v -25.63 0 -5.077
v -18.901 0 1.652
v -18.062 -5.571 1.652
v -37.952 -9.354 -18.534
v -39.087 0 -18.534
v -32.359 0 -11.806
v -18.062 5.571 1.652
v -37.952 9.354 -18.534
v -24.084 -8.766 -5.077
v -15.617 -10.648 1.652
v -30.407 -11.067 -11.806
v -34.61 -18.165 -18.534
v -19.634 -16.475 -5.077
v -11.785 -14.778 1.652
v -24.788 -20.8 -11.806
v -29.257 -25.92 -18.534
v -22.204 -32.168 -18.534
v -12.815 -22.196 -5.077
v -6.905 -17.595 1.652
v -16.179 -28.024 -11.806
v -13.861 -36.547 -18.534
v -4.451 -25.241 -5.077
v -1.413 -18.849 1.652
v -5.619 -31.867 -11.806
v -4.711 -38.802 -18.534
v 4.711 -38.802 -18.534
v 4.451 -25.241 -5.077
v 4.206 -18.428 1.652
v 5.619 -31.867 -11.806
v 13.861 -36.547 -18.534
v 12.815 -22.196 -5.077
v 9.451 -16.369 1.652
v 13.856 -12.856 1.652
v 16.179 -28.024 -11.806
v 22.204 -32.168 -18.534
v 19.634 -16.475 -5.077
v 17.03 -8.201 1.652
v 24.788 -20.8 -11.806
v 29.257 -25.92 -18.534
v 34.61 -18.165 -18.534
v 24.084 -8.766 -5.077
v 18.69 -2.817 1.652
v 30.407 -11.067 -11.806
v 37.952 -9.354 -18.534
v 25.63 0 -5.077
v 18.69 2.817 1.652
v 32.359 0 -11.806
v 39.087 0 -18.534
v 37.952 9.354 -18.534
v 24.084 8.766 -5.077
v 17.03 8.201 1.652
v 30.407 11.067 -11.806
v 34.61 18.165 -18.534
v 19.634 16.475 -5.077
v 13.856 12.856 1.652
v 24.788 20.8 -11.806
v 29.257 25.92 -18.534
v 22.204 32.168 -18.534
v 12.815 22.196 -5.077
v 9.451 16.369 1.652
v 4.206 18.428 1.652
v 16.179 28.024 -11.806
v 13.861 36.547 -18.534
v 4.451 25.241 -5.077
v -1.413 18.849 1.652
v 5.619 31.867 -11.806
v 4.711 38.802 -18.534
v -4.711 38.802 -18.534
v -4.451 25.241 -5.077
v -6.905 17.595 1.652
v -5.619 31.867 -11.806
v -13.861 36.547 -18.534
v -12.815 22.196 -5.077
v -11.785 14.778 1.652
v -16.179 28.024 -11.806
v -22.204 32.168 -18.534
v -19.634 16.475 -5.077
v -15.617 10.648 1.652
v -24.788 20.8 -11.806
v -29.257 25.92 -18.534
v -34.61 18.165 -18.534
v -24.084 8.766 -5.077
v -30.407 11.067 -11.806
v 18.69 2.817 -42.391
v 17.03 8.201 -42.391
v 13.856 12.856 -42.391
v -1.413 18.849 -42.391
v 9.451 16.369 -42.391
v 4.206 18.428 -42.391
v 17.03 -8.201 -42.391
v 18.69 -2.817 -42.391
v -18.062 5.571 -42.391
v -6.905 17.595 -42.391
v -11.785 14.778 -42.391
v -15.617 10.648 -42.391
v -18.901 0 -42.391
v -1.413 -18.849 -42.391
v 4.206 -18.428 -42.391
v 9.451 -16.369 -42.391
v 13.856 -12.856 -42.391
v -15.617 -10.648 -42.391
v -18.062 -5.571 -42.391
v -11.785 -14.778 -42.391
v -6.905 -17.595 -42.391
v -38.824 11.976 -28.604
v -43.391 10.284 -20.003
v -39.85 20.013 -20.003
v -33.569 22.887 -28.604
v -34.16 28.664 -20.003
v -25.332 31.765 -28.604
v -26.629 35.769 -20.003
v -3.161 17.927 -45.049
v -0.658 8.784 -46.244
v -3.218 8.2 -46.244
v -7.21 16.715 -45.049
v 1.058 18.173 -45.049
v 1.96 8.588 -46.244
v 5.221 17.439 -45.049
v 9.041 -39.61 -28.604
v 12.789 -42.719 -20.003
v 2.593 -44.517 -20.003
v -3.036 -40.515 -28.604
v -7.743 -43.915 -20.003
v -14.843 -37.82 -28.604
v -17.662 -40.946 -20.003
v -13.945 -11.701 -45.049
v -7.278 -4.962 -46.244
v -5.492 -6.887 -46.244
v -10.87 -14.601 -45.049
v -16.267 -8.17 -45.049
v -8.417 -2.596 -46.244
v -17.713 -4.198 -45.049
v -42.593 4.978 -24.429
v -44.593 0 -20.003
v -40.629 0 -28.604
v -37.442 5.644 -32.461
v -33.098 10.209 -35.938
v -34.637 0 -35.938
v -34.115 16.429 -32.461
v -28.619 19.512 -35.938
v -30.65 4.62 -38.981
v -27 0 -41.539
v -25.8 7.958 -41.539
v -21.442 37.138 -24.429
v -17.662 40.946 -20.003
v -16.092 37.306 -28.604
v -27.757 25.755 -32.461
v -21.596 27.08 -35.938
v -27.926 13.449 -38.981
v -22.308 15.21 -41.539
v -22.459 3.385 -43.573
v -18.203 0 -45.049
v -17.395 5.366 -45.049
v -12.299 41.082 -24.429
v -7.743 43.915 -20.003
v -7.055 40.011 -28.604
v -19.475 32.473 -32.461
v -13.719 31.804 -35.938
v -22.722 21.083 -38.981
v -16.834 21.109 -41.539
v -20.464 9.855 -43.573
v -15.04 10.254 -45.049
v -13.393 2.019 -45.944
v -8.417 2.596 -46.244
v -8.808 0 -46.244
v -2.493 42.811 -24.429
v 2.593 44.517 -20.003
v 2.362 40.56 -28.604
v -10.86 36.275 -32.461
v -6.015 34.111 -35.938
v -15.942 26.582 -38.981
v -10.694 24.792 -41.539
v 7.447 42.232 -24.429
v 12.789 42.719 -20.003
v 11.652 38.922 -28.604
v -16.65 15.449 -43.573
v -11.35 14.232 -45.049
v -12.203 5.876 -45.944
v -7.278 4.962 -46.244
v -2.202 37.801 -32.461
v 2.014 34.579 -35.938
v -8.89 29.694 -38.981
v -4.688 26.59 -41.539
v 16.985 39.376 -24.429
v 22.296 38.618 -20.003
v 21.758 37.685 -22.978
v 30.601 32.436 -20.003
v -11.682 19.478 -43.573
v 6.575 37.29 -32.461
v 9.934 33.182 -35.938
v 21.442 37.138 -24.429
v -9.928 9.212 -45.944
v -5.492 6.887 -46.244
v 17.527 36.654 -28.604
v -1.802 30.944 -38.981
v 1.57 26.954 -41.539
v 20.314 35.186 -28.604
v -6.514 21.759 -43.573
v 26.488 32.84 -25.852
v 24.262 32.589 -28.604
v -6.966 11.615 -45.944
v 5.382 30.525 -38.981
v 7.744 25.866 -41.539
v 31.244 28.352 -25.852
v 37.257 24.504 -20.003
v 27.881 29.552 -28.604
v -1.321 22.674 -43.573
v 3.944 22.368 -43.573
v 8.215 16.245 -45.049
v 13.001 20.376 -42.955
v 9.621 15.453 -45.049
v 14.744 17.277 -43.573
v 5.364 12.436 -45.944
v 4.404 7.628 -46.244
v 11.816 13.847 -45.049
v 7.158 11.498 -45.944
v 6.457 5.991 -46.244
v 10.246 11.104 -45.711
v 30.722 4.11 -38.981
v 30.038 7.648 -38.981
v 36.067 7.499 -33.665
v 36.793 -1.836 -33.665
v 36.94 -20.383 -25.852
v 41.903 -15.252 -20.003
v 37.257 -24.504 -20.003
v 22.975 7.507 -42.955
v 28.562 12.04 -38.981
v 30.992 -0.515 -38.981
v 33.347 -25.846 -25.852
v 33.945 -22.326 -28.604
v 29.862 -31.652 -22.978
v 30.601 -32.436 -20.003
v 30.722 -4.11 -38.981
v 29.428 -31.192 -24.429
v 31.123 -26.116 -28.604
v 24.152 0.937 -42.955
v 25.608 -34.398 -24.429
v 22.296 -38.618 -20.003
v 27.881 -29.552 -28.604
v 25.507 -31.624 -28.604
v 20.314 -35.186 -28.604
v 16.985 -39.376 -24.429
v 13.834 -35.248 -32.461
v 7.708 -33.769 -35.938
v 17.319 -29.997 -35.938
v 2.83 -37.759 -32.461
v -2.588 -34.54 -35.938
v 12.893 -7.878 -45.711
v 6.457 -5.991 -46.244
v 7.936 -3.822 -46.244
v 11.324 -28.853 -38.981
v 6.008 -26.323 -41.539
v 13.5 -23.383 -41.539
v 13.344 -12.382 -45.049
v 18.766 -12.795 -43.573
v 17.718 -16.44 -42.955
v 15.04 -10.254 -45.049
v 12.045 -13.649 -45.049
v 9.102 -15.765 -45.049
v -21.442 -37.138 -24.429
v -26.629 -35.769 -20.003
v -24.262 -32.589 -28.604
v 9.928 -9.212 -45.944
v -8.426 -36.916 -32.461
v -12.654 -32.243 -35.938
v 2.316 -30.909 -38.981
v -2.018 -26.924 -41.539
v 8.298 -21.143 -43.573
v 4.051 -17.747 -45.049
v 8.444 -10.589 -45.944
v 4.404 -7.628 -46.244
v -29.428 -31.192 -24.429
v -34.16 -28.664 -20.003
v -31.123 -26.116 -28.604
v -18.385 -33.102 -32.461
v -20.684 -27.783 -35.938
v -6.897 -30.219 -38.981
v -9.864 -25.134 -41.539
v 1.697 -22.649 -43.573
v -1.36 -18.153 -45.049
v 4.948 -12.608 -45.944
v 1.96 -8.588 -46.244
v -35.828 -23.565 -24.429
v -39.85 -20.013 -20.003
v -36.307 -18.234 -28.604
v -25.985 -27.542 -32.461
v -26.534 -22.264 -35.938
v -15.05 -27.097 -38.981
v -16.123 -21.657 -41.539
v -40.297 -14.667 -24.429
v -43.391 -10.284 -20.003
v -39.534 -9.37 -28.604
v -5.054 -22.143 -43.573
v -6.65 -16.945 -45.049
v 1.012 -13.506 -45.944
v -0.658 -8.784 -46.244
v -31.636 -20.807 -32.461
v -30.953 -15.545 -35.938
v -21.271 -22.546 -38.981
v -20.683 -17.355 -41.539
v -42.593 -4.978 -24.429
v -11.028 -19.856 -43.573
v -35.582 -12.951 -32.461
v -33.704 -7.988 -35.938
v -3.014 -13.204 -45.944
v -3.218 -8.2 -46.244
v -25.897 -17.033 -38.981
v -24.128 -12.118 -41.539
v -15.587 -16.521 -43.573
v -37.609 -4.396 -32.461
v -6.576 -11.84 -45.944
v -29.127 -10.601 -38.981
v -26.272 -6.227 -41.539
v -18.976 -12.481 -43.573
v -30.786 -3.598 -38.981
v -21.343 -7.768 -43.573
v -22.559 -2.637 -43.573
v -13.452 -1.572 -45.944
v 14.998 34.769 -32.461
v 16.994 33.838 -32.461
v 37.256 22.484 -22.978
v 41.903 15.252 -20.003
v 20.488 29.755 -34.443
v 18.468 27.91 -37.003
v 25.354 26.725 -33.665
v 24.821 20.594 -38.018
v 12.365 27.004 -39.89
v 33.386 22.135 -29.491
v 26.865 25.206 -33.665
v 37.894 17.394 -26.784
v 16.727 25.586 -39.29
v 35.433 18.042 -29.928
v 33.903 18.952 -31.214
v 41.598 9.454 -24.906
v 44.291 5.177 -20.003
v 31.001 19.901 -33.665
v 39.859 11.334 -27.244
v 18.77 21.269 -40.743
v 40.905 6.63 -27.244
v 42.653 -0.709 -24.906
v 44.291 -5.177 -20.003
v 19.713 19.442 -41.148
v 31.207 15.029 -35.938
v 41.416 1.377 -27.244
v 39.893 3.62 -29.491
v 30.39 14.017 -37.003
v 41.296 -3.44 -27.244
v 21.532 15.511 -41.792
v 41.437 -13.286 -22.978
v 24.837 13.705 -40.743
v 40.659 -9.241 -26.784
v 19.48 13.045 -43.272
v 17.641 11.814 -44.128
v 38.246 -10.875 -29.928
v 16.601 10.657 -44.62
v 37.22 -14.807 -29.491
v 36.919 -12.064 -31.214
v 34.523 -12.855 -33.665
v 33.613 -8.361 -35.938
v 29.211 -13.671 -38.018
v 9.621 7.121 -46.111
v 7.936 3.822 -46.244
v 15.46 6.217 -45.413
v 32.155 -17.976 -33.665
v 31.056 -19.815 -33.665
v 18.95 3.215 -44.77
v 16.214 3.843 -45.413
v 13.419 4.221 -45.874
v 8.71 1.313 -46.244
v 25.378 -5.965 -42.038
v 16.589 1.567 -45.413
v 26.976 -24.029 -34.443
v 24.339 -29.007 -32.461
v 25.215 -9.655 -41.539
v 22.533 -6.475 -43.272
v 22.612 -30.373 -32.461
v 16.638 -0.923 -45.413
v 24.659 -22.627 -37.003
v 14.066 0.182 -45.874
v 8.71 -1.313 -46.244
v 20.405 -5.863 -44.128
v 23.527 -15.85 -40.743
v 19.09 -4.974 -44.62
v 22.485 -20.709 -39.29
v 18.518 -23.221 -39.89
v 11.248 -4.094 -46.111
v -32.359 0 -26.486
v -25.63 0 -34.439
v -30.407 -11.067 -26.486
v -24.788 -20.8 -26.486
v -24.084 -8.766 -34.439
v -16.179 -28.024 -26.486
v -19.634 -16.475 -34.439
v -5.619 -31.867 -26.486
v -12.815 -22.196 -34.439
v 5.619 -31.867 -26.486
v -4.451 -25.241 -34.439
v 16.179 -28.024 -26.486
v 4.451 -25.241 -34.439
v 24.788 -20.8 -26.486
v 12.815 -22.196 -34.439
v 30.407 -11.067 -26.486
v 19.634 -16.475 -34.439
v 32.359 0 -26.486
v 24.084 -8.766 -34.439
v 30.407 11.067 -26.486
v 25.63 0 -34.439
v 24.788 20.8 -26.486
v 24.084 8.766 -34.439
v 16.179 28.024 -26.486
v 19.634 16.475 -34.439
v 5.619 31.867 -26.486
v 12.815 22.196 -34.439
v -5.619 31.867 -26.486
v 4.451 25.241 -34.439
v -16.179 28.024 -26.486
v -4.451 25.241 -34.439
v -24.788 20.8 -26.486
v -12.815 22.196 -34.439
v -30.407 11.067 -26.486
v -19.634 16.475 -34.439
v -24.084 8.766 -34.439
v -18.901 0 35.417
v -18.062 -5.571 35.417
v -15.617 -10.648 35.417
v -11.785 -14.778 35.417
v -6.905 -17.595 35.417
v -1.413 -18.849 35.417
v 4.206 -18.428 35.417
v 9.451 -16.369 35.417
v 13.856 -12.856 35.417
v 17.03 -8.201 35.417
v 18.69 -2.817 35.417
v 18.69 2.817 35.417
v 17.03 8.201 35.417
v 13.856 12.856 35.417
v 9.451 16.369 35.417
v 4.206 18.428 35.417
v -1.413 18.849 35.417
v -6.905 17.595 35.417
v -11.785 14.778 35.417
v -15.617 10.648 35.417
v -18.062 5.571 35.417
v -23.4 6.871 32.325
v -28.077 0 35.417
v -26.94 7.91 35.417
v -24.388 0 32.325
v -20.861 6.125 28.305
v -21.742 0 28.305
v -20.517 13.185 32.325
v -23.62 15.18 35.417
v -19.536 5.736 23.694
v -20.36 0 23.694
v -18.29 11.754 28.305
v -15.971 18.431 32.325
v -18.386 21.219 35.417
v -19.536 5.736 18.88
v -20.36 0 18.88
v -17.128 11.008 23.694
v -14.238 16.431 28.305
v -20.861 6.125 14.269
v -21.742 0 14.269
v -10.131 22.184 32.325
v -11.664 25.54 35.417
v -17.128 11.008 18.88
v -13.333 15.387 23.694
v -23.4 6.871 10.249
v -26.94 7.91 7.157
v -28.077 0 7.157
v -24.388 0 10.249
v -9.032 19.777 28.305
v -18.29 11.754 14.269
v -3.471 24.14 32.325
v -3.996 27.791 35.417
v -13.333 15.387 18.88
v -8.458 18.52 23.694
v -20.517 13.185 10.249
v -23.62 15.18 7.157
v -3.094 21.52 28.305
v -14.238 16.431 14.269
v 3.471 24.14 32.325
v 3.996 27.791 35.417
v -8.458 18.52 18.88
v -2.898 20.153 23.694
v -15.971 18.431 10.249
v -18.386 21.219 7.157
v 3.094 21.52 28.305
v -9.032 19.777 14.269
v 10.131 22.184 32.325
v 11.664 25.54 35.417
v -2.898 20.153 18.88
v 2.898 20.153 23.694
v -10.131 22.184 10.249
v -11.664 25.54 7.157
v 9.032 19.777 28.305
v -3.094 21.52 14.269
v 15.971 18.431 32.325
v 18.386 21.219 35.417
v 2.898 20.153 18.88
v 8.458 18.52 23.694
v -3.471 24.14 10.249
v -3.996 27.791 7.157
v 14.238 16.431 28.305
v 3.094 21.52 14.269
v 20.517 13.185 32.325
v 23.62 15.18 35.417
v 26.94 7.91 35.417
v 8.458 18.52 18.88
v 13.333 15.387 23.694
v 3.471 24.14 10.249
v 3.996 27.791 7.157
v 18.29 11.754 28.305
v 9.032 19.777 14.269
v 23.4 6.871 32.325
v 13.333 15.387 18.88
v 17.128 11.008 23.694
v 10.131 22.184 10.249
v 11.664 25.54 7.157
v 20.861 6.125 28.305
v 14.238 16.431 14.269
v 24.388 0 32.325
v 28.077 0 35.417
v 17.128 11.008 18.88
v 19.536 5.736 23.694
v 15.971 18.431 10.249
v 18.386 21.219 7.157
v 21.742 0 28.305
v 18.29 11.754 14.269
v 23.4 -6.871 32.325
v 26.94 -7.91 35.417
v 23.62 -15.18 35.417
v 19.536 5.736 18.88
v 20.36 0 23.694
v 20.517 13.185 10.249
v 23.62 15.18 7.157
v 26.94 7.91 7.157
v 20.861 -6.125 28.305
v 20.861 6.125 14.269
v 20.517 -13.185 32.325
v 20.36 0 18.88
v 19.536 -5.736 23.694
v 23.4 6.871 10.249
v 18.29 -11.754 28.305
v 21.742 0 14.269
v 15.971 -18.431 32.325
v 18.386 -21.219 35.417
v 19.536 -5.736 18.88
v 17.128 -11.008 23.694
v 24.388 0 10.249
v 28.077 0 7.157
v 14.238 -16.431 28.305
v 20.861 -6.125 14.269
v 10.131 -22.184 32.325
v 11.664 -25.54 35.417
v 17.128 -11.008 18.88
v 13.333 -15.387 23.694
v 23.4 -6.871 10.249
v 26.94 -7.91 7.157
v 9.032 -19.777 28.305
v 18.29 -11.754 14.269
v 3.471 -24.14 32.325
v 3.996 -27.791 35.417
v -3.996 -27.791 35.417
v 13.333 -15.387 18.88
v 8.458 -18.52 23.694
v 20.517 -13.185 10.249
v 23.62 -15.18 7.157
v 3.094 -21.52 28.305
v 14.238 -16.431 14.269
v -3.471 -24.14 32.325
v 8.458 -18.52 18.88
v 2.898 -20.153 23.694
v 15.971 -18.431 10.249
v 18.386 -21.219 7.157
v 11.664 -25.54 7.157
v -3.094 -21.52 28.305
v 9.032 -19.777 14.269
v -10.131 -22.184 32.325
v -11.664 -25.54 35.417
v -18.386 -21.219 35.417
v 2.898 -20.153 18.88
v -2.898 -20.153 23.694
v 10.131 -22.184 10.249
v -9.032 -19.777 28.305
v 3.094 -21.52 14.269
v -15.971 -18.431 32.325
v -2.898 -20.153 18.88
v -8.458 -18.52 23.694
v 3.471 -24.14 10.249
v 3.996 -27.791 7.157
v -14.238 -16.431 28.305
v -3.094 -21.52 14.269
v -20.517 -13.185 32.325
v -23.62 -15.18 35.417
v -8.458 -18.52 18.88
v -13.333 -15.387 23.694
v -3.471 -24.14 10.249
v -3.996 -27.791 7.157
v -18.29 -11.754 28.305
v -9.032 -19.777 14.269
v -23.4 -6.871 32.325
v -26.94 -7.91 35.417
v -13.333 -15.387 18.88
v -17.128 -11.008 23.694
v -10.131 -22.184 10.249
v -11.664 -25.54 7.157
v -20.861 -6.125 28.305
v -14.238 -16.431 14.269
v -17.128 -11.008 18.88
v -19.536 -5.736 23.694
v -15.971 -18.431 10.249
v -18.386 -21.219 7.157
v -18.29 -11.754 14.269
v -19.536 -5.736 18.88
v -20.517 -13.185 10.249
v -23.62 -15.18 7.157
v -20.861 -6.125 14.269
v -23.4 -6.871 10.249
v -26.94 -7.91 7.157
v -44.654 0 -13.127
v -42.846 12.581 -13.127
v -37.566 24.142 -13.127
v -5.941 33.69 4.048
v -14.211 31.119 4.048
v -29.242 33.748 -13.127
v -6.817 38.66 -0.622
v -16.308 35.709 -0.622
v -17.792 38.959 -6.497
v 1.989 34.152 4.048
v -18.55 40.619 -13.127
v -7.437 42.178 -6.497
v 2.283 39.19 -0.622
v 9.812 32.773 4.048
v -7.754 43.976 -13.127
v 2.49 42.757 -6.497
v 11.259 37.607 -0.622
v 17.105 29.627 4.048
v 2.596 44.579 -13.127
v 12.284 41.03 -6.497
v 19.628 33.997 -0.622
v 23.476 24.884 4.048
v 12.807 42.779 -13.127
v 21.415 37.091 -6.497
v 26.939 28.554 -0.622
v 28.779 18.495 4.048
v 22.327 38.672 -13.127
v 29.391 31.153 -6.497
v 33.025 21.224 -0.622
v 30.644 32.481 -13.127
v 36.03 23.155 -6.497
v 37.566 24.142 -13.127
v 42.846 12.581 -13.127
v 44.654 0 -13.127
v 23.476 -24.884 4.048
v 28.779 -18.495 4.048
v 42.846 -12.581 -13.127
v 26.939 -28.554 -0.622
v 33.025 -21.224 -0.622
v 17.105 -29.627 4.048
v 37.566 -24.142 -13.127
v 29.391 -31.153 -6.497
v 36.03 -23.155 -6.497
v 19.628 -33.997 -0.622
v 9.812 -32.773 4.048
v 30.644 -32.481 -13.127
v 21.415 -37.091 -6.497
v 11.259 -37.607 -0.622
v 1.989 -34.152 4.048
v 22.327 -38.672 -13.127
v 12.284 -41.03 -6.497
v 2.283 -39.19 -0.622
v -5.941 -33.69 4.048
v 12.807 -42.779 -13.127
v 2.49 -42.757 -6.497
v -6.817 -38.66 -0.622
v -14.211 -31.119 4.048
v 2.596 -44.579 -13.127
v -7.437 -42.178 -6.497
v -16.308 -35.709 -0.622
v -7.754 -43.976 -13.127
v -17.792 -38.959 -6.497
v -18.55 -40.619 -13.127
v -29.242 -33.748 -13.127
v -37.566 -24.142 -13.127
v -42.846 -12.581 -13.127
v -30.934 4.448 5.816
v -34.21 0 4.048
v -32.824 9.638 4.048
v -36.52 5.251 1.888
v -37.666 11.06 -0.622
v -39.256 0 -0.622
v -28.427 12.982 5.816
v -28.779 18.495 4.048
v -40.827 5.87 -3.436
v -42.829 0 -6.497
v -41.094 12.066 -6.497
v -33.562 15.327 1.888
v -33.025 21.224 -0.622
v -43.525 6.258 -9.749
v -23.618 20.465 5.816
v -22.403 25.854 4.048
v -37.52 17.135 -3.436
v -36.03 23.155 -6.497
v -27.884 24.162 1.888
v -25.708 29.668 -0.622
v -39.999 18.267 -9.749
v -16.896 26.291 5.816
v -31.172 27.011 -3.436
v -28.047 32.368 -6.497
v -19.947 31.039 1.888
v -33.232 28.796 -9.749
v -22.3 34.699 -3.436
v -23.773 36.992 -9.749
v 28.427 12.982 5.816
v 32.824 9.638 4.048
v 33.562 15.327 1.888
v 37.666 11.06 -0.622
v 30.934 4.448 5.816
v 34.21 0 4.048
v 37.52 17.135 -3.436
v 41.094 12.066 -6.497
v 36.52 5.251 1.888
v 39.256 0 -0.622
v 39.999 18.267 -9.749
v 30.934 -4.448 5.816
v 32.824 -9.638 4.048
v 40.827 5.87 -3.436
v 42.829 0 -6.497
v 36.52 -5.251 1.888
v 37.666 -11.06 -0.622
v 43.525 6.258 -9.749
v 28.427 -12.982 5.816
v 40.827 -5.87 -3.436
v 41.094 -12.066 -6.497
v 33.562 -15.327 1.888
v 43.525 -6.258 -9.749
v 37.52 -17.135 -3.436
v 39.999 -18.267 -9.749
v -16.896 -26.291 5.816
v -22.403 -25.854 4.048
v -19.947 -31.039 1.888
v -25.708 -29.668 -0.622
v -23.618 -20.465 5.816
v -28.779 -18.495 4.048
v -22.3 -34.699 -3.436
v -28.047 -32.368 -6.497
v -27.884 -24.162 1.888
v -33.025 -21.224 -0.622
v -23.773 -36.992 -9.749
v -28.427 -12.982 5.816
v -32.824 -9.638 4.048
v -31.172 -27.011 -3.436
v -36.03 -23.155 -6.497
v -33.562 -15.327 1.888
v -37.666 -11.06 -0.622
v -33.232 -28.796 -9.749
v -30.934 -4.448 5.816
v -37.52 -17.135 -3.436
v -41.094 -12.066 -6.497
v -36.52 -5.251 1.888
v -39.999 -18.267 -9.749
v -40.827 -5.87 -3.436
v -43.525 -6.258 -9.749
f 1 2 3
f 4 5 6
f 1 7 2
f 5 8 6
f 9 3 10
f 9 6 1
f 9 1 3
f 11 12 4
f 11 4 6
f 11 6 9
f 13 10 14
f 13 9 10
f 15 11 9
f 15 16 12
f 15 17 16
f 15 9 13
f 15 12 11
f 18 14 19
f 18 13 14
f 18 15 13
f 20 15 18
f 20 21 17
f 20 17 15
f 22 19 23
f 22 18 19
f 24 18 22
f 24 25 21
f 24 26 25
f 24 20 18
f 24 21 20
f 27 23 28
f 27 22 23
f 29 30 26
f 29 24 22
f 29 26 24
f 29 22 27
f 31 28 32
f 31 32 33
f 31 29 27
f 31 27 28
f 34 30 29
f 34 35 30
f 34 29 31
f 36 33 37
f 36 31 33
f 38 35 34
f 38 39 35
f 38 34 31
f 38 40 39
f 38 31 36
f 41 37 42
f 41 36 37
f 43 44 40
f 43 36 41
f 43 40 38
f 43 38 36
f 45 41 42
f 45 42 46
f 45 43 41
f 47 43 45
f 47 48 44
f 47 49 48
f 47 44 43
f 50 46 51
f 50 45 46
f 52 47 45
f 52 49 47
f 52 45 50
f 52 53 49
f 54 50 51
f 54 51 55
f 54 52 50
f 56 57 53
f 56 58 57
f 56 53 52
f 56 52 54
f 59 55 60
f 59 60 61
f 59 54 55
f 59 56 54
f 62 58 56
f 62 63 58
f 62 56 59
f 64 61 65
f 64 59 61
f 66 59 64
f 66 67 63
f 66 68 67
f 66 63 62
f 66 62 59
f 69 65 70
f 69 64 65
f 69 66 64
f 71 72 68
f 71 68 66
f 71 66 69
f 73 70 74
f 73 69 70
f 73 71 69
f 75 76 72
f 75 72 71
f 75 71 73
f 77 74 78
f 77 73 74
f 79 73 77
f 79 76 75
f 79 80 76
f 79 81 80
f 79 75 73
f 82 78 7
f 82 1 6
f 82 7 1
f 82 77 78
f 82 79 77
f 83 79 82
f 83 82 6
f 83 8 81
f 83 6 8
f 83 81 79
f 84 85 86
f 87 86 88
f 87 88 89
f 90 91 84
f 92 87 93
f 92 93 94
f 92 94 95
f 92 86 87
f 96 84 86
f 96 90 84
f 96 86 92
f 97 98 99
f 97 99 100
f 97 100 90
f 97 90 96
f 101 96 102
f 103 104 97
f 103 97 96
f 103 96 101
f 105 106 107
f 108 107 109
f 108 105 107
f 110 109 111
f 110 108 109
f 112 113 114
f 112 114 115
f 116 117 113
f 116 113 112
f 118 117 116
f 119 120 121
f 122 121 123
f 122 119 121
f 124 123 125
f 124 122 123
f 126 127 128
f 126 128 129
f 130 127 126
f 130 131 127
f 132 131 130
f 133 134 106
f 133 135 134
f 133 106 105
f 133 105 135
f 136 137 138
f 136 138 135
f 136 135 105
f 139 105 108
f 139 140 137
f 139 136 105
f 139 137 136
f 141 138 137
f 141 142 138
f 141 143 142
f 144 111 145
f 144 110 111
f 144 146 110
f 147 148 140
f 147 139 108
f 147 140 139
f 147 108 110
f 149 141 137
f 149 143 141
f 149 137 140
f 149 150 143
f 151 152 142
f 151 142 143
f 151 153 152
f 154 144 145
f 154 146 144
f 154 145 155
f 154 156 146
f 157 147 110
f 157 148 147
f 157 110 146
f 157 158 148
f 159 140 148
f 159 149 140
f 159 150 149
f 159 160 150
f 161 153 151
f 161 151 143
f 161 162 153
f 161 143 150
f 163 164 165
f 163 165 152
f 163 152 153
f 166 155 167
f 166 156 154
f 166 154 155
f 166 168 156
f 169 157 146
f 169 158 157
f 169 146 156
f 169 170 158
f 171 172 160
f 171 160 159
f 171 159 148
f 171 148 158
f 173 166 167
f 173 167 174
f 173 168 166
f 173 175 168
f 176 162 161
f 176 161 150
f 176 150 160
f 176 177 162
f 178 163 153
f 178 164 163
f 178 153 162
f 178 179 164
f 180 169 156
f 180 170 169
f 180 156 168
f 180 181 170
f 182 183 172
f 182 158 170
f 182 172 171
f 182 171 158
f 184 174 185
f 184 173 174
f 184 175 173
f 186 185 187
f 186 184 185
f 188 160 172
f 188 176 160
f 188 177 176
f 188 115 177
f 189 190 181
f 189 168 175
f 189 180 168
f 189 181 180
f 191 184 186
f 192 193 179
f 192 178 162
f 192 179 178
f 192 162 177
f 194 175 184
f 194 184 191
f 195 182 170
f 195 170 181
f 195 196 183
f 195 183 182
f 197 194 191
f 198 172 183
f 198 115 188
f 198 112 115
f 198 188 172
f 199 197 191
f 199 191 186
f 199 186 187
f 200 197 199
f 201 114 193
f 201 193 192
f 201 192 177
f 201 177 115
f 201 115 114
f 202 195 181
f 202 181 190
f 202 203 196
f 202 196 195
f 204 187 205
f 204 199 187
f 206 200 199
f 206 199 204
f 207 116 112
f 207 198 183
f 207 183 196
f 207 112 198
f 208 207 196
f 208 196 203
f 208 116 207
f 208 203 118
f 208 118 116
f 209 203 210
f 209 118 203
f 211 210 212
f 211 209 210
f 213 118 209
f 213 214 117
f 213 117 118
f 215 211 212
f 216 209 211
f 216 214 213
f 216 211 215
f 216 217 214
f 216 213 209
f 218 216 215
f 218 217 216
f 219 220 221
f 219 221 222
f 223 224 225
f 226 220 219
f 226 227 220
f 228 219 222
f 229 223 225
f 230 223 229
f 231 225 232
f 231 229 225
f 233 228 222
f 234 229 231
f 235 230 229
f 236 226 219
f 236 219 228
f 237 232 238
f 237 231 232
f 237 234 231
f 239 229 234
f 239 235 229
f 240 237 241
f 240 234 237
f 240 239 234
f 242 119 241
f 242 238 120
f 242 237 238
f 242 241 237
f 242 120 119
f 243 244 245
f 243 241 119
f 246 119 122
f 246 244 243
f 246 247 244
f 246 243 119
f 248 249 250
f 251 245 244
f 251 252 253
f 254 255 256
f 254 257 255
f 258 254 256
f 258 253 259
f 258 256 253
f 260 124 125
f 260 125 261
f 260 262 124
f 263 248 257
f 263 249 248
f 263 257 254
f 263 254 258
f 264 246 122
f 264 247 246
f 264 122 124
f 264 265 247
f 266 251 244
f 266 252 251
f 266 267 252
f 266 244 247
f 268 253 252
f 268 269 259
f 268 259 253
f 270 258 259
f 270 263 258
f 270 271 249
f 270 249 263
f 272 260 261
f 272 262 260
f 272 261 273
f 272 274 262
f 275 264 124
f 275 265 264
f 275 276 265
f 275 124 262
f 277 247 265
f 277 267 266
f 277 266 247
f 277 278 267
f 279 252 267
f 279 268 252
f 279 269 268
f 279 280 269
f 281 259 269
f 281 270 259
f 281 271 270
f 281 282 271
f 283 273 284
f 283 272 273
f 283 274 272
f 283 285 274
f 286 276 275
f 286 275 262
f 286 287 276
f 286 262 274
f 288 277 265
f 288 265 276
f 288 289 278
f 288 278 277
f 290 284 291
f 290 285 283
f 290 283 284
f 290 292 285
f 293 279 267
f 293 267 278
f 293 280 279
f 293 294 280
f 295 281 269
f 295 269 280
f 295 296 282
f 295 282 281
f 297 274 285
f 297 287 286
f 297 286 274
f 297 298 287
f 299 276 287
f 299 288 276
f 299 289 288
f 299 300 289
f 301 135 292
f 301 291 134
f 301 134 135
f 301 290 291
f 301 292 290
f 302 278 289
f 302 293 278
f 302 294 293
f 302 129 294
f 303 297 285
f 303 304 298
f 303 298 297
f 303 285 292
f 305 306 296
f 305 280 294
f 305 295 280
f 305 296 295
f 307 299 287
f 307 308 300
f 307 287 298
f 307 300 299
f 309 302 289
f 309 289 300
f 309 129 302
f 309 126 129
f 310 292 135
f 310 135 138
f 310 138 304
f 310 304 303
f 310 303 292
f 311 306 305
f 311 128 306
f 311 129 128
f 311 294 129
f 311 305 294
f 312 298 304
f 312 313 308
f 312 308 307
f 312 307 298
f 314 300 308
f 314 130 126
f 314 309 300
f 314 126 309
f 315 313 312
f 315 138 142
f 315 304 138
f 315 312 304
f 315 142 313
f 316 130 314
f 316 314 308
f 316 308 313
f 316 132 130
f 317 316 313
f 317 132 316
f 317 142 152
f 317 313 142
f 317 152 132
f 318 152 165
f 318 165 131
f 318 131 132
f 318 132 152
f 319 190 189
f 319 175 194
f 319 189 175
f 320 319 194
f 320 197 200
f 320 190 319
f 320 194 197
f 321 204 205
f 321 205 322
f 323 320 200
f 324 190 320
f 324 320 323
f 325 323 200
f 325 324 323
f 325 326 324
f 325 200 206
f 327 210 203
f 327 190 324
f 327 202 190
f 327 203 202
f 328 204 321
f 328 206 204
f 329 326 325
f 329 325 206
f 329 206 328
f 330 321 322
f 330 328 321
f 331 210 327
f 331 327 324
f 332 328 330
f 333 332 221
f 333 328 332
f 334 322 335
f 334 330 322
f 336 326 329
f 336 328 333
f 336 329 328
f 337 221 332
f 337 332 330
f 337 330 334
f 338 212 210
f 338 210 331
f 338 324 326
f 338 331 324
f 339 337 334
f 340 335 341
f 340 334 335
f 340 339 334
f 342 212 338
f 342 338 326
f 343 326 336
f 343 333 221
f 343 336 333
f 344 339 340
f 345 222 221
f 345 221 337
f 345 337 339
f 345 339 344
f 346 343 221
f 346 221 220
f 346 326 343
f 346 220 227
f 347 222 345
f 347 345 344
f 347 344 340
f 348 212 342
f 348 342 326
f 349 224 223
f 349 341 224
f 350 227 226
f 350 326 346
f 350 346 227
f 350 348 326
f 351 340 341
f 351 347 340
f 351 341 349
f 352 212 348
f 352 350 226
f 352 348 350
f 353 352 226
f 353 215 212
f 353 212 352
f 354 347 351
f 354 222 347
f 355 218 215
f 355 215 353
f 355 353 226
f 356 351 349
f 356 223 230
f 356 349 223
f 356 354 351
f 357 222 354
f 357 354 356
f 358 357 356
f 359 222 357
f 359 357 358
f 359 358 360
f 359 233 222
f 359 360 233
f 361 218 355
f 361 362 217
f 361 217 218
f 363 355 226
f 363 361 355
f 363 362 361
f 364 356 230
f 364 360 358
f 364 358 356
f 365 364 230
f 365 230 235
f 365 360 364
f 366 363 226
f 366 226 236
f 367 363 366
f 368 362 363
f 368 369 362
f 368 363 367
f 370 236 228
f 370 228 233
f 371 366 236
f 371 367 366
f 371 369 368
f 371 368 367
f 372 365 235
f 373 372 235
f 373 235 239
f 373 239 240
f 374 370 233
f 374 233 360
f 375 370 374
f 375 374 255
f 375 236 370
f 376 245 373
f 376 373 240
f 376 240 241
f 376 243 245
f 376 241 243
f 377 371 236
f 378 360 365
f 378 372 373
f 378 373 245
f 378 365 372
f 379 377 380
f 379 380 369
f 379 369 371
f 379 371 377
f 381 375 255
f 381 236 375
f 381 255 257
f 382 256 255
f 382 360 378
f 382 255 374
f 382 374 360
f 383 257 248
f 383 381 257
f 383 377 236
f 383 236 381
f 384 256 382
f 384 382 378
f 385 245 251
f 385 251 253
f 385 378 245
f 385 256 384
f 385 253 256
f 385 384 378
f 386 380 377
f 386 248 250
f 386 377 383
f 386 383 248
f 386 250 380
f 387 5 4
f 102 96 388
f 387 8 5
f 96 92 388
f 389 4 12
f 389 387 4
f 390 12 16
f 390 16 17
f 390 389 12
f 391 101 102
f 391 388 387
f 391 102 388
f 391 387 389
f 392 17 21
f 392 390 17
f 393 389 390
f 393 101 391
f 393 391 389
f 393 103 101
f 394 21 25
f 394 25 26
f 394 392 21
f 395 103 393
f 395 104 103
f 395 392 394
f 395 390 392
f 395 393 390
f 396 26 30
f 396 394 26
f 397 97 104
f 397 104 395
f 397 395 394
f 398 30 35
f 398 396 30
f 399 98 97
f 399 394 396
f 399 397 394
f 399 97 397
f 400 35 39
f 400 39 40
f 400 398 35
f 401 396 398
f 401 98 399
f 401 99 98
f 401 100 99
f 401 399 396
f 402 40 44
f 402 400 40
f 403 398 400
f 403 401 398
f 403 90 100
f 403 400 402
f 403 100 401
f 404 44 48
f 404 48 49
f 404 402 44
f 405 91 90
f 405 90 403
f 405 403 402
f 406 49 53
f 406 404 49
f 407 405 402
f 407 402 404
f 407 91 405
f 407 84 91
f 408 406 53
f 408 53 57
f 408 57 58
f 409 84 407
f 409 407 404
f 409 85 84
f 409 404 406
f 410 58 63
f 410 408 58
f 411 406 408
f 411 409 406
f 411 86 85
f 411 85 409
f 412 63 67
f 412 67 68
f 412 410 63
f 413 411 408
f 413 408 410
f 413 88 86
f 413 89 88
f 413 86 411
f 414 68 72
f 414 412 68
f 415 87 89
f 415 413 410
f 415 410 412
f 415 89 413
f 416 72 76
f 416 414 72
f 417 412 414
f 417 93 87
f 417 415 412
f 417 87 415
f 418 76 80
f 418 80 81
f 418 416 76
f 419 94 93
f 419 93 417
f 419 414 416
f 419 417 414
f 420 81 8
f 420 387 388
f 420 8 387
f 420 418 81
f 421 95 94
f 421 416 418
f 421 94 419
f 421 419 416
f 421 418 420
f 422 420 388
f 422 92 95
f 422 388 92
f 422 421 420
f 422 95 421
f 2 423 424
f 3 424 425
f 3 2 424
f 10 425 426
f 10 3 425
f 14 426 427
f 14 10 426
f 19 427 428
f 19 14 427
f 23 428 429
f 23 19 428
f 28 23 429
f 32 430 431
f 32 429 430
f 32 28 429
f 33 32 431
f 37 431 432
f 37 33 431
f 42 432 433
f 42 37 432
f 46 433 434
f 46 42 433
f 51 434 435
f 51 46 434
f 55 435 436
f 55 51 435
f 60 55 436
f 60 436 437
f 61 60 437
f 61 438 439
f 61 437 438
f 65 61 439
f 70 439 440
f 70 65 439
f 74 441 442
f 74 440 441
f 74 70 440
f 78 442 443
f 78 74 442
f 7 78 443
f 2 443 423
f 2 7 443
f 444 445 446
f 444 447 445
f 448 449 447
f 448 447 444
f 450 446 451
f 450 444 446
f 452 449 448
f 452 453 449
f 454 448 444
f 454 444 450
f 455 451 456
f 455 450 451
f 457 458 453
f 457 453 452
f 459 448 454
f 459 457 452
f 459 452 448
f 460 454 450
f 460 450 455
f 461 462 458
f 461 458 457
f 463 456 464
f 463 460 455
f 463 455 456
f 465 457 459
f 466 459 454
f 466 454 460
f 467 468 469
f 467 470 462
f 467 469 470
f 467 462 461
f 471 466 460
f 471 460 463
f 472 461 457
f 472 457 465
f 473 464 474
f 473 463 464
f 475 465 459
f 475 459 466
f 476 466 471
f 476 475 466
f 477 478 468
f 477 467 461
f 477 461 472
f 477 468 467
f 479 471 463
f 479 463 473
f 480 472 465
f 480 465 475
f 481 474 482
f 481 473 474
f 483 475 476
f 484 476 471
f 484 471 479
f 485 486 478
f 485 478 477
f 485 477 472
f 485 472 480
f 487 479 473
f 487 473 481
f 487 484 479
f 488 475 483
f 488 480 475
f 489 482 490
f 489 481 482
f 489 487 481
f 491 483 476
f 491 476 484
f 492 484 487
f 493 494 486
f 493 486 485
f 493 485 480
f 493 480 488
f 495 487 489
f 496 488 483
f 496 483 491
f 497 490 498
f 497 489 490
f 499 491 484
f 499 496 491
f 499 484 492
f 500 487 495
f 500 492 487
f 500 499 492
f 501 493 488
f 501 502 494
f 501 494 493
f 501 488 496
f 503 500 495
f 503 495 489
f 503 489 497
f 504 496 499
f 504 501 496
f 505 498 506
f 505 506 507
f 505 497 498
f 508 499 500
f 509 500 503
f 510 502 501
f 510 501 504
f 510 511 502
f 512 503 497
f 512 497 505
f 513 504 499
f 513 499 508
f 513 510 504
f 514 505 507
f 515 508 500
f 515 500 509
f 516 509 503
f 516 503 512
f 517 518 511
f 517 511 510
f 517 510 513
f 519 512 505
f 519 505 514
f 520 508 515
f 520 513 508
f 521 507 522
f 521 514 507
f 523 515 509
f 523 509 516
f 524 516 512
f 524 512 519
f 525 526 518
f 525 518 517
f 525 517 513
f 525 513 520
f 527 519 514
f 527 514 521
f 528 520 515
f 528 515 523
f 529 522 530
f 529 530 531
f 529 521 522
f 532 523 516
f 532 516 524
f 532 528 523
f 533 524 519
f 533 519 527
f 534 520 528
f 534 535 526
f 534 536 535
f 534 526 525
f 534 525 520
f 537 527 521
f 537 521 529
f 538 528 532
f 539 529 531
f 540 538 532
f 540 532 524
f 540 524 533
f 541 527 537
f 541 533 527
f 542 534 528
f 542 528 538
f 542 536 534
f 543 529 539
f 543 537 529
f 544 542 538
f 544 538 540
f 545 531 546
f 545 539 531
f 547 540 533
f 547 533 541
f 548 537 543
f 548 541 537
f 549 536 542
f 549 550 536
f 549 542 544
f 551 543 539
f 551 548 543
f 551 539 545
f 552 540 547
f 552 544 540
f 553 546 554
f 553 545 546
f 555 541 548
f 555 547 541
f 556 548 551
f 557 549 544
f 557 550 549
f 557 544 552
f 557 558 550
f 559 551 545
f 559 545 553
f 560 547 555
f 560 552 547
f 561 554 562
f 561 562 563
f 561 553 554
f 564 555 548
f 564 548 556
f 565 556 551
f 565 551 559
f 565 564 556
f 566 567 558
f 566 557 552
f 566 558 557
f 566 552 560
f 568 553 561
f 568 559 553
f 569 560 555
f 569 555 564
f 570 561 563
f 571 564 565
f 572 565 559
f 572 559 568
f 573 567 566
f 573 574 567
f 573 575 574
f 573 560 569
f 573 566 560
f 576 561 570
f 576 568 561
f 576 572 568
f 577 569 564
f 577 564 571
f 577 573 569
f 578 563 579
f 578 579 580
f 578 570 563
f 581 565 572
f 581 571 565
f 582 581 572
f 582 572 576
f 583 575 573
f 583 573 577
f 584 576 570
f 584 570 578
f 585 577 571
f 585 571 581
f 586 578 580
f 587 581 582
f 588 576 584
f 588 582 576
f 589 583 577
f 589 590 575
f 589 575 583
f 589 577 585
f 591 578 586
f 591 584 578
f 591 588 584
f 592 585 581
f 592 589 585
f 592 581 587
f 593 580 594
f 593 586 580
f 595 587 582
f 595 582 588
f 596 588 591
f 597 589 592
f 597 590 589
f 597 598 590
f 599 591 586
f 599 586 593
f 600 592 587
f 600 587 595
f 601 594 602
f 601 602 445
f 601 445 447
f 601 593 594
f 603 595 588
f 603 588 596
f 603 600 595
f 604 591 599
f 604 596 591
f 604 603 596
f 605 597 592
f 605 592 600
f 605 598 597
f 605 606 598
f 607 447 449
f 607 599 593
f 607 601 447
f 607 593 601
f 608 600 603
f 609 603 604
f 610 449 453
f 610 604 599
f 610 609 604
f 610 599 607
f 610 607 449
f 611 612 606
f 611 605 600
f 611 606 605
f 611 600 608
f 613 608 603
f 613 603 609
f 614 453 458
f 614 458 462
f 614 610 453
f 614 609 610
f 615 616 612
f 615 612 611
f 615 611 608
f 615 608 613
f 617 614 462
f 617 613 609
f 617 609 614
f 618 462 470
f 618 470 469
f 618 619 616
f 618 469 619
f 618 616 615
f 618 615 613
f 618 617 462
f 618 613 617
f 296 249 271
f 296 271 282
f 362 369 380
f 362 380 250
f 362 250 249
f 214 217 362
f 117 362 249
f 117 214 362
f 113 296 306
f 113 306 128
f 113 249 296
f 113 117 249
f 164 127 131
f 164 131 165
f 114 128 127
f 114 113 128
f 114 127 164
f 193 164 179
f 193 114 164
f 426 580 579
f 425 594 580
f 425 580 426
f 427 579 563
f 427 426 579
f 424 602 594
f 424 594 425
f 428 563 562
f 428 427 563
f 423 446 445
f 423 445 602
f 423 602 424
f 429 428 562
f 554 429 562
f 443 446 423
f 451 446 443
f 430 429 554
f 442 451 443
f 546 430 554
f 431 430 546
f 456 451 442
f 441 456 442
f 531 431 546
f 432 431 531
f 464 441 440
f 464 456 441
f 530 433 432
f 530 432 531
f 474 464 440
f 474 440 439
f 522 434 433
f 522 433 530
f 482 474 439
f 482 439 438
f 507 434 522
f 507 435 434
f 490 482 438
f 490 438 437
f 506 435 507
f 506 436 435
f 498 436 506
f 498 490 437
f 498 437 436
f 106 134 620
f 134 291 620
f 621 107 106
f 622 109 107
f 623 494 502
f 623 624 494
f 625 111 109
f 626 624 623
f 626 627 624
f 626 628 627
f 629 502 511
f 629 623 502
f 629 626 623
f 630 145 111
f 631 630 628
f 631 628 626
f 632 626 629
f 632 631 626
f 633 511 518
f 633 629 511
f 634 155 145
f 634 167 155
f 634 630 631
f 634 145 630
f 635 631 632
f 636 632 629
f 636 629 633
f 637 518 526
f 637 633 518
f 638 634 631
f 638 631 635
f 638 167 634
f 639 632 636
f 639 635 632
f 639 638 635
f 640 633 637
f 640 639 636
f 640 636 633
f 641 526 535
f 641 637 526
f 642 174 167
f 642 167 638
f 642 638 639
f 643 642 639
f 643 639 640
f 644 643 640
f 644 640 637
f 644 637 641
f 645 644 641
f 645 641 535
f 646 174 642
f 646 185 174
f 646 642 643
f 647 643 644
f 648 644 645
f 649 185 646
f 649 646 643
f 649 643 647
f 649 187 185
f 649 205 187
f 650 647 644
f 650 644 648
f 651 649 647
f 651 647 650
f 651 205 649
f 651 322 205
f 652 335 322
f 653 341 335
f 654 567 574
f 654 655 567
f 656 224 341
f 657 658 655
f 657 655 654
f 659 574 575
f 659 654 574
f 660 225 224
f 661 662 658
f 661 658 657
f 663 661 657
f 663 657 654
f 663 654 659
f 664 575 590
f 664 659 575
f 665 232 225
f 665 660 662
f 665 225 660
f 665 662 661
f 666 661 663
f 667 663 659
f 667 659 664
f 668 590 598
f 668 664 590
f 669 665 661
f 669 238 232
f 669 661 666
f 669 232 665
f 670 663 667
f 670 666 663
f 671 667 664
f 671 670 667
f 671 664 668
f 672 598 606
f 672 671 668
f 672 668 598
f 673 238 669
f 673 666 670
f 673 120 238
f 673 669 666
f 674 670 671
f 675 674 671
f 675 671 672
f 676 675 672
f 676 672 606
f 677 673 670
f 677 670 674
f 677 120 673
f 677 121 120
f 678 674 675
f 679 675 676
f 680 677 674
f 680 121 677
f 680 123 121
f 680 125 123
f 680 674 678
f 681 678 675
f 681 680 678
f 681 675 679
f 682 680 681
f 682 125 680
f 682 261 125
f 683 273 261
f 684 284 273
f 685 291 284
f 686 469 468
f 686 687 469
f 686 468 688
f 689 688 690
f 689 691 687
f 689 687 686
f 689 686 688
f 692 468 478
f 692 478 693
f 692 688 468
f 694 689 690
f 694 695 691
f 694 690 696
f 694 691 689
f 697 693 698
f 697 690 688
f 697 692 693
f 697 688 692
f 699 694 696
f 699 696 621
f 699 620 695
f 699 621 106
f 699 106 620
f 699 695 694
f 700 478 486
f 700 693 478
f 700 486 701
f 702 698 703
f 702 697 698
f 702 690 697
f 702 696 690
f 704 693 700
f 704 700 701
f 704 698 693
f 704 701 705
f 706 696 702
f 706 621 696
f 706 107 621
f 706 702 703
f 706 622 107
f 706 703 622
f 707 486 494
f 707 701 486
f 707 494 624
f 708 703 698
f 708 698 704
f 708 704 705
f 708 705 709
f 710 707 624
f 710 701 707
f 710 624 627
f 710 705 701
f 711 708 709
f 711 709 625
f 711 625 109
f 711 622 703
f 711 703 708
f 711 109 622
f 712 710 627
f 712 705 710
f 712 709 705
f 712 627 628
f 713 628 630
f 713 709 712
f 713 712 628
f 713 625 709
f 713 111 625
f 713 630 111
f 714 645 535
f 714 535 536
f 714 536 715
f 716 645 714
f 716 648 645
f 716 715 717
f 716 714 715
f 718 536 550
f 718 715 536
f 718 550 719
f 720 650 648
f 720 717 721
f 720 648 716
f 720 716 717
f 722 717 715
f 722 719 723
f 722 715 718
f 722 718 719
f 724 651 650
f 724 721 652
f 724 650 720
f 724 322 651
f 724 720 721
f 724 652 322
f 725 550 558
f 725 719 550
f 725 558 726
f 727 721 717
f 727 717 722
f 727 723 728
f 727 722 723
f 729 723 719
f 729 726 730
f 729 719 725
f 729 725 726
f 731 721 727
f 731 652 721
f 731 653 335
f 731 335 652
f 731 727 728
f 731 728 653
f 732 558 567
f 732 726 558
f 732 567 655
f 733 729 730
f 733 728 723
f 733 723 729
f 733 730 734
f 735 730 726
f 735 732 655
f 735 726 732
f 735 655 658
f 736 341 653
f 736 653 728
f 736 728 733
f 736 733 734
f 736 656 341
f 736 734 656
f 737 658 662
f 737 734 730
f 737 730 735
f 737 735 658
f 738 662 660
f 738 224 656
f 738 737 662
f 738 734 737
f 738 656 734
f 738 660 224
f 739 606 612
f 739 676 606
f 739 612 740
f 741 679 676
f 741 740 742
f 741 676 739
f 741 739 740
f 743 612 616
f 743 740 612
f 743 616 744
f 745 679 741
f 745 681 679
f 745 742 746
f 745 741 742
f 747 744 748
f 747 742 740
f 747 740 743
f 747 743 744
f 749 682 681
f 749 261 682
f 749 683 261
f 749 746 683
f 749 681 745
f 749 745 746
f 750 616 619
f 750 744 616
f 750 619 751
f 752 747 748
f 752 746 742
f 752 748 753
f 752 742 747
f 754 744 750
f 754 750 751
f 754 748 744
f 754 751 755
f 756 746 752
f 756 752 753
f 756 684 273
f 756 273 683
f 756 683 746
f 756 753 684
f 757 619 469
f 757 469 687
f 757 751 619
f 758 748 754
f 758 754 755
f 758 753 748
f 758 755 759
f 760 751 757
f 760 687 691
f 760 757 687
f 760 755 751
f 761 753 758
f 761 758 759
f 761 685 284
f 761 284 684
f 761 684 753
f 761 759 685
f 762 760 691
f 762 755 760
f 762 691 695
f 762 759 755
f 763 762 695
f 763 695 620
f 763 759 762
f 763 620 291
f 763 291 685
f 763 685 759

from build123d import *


with BuildPart() as f1:
    # F0 (on Front) → F1 (revolve)
    with BuildSketch(Plane.XZ):
        with BuildLine():
            Line((-8.808441, -46.244312), (0, -46.244312))
            Line((0, -46.244312), (0, 35.41727))
            Line((0, 35.41727), (-28.076904, 35.41727))
            ThreePointArc((-28.076904, 35.41727), (-20.184994, 21.287064), (-28.076904, 7.156858))
            ThreePointArc((-28.076904, 7.156858), (-41.247046, -3.435655), (-44.592731, -20.002501))
            ThreePointArc((-44.592731, -20.002501), (-30.995982, -38.980766), (-8.808441, -46.244312))
        make_face()
    revolve(axis=Axis((0, 0, -5.413521), (0, 0, -1)))

    # F2 (on Front) → F3 (revolve, cut)
    with BuildSketch(Plane.XZ):
        Polygon((0, 35.600781), (-18.901445, 35.600781), (-18.901445, 1.651583), (-39.087456, -18.534428), (-18.901445, -42.390618), (0, -42.390618), align=None)
    revolve(axis=Axis((0, 0, -3.394919), (0, 0, 1)), mode=Mode.SUBTRACT)


solid = f1.part
